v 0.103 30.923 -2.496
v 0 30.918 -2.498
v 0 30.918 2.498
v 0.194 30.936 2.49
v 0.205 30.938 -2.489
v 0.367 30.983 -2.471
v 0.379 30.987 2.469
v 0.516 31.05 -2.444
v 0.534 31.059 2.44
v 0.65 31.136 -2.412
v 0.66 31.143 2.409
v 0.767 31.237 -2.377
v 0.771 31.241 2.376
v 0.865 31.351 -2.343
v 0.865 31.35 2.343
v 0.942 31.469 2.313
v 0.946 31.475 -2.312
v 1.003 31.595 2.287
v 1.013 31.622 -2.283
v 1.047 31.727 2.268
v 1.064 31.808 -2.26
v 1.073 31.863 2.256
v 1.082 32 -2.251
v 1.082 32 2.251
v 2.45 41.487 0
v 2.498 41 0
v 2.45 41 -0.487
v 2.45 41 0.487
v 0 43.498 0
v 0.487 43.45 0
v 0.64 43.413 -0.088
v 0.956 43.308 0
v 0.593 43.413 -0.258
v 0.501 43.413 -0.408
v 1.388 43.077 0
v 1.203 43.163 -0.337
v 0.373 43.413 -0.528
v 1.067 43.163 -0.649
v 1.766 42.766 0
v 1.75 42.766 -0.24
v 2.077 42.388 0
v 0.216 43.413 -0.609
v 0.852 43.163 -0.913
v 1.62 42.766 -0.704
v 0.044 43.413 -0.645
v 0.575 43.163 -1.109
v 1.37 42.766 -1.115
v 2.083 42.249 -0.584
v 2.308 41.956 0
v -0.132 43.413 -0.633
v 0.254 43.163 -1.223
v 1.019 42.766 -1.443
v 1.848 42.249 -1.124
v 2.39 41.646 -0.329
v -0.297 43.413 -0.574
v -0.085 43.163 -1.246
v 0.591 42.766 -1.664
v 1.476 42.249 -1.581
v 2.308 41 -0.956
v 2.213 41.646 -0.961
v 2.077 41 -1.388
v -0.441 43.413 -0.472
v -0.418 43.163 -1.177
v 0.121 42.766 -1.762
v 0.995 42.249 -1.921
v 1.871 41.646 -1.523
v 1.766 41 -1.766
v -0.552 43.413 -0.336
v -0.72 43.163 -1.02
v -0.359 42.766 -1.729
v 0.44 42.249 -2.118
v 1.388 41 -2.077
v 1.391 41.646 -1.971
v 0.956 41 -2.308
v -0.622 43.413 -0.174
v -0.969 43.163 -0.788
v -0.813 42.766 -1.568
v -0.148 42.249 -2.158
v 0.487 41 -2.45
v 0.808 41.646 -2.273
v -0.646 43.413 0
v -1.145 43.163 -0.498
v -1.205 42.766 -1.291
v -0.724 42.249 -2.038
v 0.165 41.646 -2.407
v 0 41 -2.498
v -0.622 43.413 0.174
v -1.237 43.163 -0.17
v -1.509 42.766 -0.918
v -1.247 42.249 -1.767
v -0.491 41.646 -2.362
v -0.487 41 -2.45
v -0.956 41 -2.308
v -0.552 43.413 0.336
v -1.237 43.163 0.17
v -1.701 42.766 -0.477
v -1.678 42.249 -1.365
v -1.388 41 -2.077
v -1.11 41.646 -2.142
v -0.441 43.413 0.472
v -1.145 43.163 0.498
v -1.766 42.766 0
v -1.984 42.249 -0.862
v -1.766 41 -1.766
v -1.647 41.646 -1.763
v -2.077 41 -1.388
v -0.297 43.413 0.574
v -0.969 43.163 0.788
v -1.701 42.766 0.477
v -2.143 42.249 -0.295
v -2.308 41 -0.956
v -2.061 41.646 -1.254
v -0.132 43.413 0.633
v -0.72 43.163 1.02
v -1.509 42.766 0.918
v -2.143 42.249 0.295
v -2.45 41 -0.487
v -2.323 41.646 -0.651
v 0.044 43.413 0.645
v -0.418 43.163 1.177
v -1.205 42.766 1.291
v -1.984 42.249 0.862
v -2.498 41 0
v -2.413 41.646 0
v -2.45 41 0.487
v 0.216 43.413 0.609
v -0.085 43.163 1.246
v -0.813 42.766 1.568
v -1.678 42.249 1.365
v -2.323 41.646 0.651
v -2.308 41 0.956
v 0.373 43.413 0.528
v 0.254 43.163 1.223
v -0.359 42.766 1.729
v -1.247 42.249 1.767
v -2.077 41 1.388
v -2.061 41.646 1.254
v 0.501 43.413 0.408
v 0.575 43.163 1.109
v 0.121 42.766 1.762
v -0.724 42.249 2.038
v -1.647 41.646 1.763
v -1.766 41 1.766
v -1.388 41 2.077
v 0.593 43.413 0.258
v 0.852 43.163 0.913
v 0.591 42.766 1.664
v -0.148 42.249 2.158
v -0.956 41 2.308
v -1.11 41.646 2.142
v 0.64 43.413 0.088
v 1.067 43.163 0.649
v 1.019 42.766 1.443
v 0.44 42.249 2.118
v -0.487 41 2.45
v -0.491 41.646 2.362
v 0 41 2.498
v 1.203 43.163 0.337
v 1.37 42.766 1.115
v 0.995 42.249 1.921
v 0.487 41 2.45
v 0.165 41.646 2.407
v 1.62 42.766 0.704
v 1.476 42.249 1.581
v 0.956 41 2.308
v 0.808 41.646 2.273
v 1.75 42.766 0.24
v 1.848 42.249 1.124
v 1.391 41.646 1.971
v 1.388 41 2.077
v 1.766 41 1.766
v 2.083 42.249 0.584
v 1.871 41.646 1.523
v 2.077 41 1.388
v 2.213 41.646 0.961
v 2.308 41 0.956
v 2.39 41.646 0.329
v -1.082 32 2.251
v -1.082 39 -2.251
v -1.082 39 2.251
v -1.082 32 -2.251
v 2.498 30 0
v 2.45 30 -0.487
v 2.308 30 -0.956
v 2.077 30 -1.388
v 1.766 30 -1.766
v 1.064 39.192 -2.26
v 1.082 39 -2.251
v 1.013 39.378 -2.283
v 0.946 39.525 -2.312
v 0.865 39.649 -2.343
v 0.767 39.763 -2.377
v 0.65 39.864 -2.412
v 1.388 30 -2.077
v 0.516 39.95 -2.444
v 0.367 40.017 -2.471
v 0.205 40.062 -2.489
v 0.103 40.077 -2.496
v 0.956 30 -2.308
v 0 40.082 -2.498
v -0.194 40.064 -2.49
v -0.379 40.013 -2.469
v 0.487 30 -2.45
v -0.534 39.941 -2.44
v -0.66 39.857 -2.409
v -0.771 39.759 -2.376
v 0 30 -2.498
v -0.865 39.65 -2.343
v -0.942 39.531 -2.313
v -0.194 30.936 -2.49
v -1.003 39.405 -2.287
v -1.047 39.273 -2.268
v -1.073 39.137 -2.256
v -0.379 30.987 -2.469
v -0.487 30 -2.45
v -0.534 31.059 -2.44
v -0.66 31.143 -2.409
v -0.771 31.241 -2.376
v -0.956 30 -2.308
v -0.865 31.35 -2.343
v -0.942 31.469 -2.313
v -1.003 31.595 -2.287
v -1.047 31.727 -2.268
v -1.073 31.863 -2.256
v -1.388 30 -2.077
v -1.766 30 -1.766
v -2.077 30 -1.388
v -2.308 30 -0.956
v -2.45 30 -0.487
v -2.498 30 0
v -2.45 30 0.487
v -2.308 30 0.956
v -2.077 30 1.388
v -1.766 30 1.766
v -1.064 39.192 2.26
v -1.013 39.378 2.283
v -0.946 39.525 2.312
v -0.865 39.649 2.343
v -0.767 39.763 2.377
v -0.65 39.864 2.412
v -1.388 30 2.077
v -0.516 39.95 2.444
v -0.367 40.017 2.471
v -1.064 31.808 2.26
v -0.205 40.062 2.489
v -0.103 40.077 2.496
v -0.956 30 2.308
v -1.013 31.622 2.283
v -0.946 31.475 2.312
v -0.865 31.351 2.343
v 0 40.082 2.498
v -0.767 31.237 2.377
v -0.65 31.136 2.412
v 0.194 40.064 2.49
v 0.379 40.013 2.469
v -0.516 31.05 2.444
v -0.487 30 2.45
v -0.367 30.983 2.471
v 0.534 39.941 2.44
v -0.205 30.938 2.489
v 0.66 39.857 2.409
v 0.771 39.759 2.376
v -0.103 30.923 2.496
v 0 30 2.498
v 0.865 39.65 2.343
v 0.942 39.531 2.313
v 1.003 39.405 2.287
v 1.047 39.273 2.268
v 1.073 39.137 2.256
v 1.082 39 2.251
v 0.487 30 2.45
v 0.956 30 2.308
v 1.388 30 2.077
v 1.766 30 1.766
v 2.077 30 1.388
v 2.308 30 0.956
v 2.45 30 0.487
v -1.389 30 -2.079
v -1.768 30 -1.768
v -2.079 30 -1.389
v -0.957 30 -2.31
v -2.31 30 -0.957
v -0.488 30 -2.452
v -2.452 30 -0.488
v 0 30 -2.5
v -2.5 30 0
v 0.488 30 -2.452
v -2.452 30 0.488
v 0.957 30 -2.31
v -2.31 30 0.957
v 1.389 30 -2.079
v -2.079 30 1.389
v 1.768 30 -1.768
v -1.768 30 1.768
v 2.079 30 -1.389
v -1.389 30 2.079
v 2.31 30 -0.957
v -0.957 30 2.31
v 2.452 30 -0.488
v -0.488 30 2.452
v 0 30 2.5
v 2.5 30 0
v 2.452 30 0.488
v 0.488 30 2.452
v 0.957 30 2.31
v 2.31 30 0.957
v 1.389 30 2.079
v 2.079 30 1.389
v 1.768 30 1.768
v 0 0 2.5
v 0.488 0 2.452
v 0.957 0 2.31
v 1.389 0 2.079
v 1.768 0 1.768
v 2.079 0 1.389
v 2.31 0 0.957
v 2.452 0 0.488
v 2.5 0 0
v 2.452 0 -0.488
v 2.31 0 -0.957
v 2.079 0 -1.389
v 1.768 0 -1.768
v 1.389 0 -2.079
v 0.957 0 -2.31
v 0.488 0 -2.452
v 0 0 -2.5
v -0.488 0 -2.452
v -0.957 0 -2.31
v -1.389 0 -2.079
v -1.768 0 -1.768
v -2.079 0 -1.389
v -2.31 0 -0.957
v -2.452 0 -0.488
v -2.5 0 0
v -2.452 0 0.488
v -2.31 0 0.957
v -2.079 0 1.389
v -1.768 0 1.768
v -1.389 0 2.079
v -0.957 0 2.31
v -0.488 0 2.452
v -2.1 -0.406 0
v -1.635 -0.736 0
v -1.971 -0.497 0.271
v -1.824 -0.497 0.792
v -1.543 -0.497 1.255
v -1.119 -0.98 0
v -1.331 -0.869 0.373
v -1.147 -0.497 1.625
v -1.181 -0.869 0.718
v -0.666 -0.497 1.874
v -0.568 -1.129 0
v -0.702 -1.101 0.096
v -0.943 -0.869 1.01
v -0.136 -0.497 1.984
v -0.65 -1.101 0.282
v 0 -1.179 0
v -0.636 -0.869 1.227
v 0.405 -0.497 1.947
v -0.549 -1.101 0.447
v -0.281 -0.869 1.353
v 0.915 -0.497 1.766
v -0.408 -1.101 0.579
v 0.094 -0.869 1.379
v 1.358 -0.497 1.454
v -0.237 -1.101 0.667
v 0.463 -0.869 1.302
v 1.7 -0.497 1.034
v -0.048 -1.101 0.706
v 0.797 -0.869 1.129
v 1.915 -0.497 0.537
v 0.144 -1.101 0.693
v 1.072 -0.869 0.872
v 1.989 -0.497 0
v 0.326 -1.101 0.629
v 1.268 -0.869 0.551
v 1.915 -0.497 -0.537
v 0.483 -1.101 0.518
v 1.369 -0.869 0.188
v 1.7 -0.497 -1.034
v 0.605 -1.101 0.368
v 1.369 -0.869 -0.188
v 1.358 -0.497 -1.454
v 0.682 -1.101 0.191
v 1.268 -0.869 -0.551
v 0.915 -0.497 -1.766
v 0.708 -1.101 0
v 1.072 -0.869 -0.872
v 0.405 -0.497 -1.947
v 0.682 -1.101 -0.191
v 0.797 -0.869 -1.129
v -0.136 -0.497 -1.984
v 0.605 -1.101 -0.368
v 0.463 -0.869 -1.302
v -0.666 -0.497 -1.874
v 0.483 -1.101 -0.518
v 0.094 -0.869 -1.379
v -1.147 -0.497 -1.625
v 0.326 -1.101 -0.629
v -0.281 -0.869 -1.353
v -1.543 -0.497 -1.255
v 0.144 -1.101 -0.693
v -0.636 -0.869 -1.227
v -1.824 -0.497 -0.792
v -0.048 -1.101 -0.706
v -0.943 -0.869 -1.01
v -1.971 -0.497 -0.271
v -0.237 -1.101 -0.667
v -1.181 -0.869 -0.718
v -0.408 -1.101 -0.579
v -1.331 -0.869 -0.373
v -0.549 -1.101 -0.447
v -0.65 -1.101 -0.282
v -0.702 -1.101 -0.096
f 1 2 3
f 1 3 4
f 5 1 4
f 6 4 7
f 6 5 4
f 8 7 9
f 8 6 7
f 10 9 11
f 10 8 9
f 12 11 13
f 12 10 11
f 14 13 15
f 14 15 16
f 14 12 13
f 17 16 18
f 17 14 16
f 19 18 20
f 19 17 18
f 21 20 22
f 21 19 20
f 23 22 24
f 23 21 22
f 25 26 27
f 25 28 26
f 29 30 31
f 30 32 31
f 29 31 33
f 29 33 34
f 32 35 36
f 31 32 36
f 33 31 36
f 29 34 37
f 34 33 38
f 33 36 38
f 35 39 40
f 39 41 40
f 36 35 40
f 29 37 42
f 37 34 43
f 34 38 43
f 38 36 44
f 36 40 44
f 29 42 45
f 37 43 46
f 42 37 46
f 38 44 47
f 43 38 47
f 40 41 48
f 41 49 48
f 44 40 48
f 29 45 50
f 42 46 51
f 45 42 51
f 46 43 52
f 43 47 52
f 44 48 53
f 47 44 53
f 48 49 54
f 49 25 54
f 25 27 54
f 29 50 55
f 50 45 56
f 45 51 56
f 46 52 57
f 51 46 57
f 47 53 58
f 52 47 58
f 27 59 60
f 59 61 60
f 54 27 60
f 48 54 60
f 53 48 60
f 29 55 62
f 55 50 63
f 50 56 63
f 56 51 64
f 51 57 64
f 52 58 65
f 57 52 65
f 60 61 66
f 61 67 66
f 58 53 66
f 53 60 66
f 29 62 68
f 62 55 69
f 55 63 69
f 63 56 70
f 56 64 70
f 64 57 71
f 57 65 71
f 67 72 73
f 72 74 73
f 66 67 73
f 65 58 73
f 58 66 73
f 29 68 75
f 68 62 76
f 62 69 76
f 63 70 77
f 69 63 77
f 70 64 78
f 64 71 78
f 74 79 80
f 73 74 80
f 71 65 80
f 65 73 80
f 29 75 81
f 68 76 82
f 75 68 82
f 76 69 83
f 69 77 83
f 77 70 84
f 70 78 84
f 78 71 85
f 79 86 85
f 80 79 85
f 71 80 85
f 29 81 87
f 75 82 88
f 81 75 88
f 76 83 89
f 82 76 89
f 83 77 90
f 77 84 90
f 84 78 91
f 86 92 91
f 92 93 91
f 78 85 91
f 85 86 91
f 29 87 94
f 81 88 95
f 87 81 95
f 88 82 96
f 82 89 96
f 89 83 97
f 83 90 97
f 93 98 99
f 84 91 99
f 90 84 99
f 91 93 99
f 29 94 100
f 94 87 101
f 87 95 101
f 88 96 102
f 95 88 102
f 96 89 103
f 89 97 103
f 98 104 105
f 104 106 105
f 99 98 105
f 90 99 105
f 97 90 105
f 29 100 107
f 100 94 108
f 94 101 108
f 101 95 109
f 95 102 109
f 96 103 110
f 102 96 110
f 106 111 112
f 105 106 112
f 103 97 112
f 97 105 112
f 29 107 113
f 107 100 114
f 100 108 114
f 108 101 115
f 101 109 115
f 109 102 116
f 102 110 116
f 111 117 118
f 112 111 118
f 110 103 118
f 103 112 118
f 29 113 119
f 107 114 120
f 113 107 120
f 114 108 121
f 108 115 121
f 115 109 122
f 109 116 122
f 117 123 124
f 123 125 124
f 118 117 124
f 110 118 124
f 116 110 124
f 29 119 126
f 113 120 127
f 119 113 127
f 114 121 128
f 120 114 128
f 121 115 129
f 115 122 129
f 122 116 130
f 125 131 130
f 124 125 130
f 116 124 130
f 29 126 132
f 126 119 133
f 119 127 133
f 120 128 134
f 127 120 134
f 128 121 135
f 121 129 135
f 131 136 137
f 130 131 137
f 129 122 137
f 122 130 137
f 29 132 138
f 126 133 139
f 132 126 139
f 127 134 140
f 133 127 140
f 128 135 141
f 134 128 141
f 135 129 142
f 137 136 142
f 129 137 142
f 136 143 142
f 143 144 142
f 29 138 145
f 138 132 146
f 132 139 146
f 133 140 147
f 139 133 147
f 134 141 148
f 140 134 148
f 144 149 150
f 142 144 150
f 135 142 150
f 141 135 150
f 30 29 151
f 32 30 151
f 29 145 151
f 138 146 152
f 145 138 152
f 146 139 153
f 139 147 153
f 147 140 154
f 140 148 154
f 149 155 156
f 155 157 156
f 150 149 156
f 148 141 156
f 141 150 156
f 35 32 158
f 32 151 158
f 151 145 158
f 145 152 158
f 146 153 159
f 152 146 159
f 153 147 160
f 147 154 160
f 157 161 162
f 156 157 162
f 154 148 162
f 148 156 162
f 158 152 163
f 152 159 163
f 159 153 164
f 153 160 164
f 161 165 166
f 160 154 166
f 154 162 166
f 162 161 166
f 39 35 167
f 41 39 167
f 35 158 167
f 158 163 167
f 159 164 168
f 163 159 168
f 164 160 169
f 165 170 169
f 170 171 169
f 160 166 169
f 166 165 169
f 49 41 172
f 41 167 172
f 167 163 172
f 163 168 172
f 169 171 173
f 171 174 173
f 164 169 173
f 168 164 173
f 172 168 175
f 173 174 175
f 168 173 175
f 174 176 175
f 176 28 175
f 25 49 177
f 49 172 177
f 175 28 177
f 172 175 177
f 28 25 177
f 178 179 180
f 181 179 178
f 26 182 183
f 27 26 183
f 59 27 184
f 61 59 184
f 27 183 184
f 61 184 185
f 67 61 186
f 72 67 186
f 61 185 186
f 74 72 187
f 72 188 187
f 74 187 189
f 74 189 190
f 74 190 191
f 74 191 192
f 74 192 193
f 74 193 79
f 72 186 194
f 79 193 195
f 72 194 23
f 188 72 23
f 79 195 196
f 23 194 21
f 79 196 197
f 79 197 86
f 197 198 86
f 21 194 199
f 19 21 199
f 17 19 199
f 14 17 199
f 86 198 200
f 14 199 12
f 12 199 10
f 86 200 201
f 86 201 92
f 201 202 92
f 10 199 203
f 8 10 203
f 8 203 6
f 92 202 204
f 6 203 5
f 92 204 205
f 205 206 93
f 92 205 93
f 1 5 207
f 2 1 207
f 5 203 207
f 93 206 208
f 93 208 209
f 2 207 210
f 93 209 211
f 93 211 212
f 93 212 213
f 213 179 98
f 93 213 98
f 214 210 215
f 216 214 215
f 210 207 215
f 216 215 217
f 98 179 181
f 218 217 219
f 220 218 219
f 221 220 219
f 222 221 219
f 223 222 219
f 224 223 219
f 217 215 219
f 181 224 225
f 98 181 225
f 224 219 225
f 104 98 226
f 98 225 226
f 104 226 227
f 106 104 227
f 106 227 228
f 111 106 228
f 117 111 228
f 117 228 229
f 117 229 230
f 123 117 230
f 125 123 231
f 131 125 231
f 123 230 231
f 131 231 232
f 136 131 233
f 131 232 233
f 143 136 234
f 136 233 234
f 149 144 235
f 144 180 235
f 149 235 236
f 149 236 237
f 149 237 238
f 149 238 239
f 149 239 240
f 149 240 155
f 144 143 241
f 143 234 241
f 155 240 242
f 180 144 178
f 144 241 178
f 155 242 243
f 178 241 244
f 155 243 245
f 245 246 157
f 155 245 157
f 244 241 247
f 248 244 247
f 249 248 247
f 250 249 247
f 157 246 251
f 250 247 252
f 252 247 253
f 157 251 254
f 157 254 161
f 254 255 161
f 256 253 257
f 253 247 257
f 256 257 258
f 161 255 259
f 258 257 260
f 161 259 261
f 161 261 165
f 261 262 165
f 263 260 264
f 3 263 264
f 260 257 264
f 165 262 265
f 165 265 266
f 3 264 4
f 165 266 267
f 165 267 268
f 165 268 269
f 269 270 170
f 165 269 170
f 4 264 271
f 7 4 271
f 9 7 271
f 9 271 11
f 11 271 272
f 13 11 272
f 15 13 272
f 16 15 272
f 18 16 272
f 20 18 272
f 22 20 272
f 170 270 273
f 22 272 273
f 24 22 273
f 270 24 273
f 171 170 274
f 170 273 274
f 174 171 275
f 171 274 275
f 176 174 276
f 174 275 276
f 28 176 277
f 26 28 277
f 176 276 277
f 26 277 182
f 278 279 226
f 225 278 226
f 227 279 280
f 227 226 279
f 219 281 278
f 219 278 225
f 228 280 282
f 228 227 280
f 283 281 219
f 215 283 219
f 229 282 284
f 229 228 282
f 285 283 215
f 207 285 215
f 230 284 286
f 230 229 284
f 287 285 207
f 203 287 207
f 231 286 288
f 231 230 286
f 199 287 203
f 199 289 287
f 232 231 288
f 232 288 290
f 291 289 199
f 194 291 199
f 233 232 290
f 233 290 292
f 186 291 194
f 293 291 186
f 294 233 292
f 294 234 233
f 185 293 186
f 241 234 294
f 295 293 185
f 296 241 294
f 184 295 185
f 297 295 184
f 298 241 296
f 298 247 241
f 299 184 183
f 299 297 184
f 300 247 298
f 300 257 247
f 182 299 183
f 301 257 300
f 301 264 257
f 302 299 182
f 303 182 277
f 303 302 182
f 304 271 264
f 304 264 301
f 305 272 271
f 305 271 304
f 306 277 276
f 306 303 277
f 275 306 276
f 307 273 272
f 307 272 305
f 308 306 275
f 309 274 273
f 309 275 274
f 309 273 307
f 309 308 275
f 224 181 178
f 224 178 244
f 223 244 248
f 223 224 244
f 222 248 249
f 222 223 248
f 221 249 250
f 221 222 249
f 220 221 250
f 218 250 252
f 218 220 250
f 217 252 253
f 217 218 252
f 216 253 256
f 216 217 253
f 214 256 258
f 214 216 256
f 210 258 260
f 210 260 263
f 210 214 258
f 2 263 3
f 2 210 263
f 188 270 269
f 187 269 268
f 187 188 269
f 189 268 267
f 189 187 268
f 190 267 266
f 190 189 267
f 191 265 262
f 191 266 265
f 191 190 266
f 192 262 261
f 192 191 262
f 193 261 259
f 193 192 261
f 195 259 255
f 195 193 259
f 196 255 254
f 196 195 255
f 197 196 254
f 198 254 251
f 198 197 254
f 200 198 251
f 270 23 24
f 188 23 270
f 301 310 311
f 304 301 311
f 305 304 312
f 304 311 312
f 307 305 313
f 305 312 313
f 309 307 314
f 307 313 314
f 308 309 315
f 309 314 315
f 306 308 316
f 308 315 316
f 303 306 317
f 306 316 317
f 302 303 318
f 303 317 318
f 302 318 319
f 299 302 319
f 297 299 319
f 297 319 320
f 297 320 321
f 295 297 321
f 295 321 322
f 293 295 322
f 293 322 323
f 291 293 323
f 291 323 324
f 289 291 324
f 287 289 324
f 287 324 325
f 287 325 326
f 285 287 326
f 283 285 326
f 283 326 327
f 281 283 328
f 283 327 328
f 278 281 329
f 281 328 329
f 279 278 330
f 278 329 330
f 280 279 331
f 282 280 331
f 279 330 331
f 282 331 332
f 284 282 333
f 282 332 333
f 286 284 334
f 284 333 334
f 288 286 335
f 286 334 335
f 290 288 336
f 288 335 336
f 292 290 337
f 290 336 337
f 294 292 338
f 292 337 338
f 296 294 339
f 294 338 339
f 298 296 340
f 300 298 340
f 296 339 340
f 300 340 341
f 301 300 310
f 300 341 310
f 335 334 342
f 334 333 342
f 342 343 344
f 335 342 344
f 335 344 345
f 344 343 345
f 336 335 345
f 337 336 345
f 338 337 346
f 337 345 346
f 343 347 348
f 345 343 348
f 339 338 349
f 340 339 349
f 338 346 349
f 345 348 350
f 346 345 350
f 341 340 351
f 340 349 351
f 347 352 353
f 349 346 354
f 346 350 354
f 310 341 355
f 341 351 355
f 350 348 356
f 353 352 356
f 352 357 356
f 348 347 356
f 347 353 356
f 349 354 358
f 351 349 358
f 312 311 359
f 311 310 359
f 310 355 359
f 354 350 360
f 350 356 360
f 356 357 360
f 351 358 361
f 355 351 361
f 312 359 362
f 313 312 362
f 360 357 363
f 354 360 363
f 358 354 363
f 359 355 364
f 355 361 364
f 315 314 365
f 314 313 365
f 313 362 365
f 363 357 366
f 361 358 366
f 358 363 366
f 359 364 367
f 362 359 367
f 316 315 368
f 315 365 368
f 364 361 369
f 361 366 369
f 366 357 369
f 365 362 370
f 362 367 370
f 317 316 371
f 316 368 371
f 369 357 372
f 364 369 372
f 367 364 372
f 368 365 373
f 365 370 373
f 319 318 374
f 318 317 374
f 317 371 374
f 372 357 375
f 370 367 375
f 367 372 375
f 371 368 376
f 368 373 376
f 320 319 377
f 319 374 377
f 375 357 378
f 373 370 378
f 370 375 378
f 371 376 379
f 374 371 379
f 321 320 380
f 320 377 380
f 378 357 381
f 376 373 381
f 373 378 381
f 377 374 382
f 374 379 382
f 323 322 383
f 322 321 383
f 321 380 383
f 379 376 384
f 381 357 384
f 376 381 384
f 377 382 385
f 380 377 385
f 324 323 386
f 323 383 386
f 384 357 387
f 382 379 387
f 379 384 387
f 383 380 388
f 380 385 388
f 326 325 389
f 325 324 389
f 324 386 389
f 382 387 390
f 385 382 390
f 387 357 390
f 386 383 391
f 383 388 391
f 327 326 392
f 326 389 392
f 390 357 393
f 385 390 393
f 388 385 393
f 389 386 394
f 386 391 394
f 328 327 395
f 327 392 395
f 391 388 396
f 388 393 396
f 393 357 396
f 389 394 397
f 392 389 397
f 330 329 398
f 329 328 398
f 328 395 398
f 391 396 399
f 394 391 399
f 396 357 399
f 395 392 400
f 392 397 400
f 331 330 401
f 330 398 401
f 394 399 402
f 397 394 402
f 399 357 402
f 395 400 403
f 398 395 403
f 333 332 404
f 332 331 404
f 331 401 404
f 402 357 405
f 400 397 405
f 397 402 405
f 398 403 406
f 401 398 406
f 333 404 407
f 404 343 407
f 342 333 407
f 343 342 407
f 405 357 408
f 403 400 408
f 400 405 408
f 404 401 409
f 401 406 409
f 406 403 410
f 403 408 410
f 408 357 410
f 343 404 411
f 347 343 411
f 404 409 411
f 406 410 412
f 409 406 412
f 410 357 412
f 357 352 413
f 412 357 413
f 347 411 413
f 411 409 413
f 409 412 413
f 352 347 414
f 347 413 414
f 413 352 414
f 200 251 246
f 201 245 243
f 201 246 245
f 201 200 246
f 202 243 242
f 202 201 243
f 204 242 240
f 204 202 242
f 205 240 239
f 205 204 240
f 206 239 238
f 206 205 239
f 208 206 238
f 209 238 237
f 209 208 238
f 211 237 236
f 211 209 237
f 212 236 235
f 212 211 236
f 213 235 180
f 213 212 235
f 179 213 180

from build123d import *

# Parameters (mm, degrees)
SZKIC2_R                        = 2.5
DODANIE_WYCI_GNI_CIE1_DEPTH     = 30
WYTNIJ_WYCI_GNI_CIE1_DEPTH      = 20
WYTNIJ_WYCI_GNI_CIE1_DEPTH_BACK = 20


with BuildPart() as part:
    # Szkic2 → Dodanie-wyciągnięcie1 (new body)
    with BuildSketch(Plane(origin=(0, 0, 0), x_dir=(1, 0, 0), z_dir=(0, 1, 0))):
        Circle(SZKIC2_R)
    extrude(amount=DODANIE_WYCI_GNI_CIE1_DEPTH)

    # Szkic3 → Obrót2 (revolve)
    with BuildSketch(Plane.XY):
        with BuildLine():
            Line((-2.497718644, 41), (-2.497718644, 30))
            Line((-2.497718644, 30), (0, 30))
            Line((0, 30), (0, 43.497718644))
            ThreePointArc((0, 43.497718644), (-1.766153791, 42.766153791), (-2.497718644, 41))
        make_face()
    revolve(axis=Axis((0, 0, 0), (0, 1, 0)))

    # Szkic3<3> → Wytnij-wyciągnięcie1 (cut, two sides: drawn at the far end of the back side and taken through both)
    with BuildSketch(Plane.XY.offset(-WYTNIJ_WYCI_GNI_CIE1_DEPTH_BACK)):
        with BuildLine():
            ThreePointArc((-1.081563109, 32), (0, 30.918436891), (1.081563109, 32))
            Line((1.081563109, 32), (1.081563109, 39))
            ThreePointArc((1.081563109, 39), (0, 40.081563109), (-1.081563109, 39))
            Line((-1.081563109, 39), (-1.081563109, 32))
        make_face()
    extrude(amount=WYTNIJ_WYCI_GNI_CIE1_DEPTH + WYTNIJ_WYCI_GNI_CIE1_DEPTH_BACK, mode=Mode.SUBTRACT)

    # Szkic4 → Obrót3 (revolve)
    with BuildSketch(Plane.XY):
        with BuildLine():
            ThreePointArc((-2.5, 0), (-1.382027756, -0.869452827), (0, -1.178983829))
            Line((0, -1.178983829), (0, 0))
            Line((0, 0), (-2.5, 0))
        make_face()
    revolve(axis=Axis((0, -1.178983829, 0), (0, 1, 0)))


solid = part.part
